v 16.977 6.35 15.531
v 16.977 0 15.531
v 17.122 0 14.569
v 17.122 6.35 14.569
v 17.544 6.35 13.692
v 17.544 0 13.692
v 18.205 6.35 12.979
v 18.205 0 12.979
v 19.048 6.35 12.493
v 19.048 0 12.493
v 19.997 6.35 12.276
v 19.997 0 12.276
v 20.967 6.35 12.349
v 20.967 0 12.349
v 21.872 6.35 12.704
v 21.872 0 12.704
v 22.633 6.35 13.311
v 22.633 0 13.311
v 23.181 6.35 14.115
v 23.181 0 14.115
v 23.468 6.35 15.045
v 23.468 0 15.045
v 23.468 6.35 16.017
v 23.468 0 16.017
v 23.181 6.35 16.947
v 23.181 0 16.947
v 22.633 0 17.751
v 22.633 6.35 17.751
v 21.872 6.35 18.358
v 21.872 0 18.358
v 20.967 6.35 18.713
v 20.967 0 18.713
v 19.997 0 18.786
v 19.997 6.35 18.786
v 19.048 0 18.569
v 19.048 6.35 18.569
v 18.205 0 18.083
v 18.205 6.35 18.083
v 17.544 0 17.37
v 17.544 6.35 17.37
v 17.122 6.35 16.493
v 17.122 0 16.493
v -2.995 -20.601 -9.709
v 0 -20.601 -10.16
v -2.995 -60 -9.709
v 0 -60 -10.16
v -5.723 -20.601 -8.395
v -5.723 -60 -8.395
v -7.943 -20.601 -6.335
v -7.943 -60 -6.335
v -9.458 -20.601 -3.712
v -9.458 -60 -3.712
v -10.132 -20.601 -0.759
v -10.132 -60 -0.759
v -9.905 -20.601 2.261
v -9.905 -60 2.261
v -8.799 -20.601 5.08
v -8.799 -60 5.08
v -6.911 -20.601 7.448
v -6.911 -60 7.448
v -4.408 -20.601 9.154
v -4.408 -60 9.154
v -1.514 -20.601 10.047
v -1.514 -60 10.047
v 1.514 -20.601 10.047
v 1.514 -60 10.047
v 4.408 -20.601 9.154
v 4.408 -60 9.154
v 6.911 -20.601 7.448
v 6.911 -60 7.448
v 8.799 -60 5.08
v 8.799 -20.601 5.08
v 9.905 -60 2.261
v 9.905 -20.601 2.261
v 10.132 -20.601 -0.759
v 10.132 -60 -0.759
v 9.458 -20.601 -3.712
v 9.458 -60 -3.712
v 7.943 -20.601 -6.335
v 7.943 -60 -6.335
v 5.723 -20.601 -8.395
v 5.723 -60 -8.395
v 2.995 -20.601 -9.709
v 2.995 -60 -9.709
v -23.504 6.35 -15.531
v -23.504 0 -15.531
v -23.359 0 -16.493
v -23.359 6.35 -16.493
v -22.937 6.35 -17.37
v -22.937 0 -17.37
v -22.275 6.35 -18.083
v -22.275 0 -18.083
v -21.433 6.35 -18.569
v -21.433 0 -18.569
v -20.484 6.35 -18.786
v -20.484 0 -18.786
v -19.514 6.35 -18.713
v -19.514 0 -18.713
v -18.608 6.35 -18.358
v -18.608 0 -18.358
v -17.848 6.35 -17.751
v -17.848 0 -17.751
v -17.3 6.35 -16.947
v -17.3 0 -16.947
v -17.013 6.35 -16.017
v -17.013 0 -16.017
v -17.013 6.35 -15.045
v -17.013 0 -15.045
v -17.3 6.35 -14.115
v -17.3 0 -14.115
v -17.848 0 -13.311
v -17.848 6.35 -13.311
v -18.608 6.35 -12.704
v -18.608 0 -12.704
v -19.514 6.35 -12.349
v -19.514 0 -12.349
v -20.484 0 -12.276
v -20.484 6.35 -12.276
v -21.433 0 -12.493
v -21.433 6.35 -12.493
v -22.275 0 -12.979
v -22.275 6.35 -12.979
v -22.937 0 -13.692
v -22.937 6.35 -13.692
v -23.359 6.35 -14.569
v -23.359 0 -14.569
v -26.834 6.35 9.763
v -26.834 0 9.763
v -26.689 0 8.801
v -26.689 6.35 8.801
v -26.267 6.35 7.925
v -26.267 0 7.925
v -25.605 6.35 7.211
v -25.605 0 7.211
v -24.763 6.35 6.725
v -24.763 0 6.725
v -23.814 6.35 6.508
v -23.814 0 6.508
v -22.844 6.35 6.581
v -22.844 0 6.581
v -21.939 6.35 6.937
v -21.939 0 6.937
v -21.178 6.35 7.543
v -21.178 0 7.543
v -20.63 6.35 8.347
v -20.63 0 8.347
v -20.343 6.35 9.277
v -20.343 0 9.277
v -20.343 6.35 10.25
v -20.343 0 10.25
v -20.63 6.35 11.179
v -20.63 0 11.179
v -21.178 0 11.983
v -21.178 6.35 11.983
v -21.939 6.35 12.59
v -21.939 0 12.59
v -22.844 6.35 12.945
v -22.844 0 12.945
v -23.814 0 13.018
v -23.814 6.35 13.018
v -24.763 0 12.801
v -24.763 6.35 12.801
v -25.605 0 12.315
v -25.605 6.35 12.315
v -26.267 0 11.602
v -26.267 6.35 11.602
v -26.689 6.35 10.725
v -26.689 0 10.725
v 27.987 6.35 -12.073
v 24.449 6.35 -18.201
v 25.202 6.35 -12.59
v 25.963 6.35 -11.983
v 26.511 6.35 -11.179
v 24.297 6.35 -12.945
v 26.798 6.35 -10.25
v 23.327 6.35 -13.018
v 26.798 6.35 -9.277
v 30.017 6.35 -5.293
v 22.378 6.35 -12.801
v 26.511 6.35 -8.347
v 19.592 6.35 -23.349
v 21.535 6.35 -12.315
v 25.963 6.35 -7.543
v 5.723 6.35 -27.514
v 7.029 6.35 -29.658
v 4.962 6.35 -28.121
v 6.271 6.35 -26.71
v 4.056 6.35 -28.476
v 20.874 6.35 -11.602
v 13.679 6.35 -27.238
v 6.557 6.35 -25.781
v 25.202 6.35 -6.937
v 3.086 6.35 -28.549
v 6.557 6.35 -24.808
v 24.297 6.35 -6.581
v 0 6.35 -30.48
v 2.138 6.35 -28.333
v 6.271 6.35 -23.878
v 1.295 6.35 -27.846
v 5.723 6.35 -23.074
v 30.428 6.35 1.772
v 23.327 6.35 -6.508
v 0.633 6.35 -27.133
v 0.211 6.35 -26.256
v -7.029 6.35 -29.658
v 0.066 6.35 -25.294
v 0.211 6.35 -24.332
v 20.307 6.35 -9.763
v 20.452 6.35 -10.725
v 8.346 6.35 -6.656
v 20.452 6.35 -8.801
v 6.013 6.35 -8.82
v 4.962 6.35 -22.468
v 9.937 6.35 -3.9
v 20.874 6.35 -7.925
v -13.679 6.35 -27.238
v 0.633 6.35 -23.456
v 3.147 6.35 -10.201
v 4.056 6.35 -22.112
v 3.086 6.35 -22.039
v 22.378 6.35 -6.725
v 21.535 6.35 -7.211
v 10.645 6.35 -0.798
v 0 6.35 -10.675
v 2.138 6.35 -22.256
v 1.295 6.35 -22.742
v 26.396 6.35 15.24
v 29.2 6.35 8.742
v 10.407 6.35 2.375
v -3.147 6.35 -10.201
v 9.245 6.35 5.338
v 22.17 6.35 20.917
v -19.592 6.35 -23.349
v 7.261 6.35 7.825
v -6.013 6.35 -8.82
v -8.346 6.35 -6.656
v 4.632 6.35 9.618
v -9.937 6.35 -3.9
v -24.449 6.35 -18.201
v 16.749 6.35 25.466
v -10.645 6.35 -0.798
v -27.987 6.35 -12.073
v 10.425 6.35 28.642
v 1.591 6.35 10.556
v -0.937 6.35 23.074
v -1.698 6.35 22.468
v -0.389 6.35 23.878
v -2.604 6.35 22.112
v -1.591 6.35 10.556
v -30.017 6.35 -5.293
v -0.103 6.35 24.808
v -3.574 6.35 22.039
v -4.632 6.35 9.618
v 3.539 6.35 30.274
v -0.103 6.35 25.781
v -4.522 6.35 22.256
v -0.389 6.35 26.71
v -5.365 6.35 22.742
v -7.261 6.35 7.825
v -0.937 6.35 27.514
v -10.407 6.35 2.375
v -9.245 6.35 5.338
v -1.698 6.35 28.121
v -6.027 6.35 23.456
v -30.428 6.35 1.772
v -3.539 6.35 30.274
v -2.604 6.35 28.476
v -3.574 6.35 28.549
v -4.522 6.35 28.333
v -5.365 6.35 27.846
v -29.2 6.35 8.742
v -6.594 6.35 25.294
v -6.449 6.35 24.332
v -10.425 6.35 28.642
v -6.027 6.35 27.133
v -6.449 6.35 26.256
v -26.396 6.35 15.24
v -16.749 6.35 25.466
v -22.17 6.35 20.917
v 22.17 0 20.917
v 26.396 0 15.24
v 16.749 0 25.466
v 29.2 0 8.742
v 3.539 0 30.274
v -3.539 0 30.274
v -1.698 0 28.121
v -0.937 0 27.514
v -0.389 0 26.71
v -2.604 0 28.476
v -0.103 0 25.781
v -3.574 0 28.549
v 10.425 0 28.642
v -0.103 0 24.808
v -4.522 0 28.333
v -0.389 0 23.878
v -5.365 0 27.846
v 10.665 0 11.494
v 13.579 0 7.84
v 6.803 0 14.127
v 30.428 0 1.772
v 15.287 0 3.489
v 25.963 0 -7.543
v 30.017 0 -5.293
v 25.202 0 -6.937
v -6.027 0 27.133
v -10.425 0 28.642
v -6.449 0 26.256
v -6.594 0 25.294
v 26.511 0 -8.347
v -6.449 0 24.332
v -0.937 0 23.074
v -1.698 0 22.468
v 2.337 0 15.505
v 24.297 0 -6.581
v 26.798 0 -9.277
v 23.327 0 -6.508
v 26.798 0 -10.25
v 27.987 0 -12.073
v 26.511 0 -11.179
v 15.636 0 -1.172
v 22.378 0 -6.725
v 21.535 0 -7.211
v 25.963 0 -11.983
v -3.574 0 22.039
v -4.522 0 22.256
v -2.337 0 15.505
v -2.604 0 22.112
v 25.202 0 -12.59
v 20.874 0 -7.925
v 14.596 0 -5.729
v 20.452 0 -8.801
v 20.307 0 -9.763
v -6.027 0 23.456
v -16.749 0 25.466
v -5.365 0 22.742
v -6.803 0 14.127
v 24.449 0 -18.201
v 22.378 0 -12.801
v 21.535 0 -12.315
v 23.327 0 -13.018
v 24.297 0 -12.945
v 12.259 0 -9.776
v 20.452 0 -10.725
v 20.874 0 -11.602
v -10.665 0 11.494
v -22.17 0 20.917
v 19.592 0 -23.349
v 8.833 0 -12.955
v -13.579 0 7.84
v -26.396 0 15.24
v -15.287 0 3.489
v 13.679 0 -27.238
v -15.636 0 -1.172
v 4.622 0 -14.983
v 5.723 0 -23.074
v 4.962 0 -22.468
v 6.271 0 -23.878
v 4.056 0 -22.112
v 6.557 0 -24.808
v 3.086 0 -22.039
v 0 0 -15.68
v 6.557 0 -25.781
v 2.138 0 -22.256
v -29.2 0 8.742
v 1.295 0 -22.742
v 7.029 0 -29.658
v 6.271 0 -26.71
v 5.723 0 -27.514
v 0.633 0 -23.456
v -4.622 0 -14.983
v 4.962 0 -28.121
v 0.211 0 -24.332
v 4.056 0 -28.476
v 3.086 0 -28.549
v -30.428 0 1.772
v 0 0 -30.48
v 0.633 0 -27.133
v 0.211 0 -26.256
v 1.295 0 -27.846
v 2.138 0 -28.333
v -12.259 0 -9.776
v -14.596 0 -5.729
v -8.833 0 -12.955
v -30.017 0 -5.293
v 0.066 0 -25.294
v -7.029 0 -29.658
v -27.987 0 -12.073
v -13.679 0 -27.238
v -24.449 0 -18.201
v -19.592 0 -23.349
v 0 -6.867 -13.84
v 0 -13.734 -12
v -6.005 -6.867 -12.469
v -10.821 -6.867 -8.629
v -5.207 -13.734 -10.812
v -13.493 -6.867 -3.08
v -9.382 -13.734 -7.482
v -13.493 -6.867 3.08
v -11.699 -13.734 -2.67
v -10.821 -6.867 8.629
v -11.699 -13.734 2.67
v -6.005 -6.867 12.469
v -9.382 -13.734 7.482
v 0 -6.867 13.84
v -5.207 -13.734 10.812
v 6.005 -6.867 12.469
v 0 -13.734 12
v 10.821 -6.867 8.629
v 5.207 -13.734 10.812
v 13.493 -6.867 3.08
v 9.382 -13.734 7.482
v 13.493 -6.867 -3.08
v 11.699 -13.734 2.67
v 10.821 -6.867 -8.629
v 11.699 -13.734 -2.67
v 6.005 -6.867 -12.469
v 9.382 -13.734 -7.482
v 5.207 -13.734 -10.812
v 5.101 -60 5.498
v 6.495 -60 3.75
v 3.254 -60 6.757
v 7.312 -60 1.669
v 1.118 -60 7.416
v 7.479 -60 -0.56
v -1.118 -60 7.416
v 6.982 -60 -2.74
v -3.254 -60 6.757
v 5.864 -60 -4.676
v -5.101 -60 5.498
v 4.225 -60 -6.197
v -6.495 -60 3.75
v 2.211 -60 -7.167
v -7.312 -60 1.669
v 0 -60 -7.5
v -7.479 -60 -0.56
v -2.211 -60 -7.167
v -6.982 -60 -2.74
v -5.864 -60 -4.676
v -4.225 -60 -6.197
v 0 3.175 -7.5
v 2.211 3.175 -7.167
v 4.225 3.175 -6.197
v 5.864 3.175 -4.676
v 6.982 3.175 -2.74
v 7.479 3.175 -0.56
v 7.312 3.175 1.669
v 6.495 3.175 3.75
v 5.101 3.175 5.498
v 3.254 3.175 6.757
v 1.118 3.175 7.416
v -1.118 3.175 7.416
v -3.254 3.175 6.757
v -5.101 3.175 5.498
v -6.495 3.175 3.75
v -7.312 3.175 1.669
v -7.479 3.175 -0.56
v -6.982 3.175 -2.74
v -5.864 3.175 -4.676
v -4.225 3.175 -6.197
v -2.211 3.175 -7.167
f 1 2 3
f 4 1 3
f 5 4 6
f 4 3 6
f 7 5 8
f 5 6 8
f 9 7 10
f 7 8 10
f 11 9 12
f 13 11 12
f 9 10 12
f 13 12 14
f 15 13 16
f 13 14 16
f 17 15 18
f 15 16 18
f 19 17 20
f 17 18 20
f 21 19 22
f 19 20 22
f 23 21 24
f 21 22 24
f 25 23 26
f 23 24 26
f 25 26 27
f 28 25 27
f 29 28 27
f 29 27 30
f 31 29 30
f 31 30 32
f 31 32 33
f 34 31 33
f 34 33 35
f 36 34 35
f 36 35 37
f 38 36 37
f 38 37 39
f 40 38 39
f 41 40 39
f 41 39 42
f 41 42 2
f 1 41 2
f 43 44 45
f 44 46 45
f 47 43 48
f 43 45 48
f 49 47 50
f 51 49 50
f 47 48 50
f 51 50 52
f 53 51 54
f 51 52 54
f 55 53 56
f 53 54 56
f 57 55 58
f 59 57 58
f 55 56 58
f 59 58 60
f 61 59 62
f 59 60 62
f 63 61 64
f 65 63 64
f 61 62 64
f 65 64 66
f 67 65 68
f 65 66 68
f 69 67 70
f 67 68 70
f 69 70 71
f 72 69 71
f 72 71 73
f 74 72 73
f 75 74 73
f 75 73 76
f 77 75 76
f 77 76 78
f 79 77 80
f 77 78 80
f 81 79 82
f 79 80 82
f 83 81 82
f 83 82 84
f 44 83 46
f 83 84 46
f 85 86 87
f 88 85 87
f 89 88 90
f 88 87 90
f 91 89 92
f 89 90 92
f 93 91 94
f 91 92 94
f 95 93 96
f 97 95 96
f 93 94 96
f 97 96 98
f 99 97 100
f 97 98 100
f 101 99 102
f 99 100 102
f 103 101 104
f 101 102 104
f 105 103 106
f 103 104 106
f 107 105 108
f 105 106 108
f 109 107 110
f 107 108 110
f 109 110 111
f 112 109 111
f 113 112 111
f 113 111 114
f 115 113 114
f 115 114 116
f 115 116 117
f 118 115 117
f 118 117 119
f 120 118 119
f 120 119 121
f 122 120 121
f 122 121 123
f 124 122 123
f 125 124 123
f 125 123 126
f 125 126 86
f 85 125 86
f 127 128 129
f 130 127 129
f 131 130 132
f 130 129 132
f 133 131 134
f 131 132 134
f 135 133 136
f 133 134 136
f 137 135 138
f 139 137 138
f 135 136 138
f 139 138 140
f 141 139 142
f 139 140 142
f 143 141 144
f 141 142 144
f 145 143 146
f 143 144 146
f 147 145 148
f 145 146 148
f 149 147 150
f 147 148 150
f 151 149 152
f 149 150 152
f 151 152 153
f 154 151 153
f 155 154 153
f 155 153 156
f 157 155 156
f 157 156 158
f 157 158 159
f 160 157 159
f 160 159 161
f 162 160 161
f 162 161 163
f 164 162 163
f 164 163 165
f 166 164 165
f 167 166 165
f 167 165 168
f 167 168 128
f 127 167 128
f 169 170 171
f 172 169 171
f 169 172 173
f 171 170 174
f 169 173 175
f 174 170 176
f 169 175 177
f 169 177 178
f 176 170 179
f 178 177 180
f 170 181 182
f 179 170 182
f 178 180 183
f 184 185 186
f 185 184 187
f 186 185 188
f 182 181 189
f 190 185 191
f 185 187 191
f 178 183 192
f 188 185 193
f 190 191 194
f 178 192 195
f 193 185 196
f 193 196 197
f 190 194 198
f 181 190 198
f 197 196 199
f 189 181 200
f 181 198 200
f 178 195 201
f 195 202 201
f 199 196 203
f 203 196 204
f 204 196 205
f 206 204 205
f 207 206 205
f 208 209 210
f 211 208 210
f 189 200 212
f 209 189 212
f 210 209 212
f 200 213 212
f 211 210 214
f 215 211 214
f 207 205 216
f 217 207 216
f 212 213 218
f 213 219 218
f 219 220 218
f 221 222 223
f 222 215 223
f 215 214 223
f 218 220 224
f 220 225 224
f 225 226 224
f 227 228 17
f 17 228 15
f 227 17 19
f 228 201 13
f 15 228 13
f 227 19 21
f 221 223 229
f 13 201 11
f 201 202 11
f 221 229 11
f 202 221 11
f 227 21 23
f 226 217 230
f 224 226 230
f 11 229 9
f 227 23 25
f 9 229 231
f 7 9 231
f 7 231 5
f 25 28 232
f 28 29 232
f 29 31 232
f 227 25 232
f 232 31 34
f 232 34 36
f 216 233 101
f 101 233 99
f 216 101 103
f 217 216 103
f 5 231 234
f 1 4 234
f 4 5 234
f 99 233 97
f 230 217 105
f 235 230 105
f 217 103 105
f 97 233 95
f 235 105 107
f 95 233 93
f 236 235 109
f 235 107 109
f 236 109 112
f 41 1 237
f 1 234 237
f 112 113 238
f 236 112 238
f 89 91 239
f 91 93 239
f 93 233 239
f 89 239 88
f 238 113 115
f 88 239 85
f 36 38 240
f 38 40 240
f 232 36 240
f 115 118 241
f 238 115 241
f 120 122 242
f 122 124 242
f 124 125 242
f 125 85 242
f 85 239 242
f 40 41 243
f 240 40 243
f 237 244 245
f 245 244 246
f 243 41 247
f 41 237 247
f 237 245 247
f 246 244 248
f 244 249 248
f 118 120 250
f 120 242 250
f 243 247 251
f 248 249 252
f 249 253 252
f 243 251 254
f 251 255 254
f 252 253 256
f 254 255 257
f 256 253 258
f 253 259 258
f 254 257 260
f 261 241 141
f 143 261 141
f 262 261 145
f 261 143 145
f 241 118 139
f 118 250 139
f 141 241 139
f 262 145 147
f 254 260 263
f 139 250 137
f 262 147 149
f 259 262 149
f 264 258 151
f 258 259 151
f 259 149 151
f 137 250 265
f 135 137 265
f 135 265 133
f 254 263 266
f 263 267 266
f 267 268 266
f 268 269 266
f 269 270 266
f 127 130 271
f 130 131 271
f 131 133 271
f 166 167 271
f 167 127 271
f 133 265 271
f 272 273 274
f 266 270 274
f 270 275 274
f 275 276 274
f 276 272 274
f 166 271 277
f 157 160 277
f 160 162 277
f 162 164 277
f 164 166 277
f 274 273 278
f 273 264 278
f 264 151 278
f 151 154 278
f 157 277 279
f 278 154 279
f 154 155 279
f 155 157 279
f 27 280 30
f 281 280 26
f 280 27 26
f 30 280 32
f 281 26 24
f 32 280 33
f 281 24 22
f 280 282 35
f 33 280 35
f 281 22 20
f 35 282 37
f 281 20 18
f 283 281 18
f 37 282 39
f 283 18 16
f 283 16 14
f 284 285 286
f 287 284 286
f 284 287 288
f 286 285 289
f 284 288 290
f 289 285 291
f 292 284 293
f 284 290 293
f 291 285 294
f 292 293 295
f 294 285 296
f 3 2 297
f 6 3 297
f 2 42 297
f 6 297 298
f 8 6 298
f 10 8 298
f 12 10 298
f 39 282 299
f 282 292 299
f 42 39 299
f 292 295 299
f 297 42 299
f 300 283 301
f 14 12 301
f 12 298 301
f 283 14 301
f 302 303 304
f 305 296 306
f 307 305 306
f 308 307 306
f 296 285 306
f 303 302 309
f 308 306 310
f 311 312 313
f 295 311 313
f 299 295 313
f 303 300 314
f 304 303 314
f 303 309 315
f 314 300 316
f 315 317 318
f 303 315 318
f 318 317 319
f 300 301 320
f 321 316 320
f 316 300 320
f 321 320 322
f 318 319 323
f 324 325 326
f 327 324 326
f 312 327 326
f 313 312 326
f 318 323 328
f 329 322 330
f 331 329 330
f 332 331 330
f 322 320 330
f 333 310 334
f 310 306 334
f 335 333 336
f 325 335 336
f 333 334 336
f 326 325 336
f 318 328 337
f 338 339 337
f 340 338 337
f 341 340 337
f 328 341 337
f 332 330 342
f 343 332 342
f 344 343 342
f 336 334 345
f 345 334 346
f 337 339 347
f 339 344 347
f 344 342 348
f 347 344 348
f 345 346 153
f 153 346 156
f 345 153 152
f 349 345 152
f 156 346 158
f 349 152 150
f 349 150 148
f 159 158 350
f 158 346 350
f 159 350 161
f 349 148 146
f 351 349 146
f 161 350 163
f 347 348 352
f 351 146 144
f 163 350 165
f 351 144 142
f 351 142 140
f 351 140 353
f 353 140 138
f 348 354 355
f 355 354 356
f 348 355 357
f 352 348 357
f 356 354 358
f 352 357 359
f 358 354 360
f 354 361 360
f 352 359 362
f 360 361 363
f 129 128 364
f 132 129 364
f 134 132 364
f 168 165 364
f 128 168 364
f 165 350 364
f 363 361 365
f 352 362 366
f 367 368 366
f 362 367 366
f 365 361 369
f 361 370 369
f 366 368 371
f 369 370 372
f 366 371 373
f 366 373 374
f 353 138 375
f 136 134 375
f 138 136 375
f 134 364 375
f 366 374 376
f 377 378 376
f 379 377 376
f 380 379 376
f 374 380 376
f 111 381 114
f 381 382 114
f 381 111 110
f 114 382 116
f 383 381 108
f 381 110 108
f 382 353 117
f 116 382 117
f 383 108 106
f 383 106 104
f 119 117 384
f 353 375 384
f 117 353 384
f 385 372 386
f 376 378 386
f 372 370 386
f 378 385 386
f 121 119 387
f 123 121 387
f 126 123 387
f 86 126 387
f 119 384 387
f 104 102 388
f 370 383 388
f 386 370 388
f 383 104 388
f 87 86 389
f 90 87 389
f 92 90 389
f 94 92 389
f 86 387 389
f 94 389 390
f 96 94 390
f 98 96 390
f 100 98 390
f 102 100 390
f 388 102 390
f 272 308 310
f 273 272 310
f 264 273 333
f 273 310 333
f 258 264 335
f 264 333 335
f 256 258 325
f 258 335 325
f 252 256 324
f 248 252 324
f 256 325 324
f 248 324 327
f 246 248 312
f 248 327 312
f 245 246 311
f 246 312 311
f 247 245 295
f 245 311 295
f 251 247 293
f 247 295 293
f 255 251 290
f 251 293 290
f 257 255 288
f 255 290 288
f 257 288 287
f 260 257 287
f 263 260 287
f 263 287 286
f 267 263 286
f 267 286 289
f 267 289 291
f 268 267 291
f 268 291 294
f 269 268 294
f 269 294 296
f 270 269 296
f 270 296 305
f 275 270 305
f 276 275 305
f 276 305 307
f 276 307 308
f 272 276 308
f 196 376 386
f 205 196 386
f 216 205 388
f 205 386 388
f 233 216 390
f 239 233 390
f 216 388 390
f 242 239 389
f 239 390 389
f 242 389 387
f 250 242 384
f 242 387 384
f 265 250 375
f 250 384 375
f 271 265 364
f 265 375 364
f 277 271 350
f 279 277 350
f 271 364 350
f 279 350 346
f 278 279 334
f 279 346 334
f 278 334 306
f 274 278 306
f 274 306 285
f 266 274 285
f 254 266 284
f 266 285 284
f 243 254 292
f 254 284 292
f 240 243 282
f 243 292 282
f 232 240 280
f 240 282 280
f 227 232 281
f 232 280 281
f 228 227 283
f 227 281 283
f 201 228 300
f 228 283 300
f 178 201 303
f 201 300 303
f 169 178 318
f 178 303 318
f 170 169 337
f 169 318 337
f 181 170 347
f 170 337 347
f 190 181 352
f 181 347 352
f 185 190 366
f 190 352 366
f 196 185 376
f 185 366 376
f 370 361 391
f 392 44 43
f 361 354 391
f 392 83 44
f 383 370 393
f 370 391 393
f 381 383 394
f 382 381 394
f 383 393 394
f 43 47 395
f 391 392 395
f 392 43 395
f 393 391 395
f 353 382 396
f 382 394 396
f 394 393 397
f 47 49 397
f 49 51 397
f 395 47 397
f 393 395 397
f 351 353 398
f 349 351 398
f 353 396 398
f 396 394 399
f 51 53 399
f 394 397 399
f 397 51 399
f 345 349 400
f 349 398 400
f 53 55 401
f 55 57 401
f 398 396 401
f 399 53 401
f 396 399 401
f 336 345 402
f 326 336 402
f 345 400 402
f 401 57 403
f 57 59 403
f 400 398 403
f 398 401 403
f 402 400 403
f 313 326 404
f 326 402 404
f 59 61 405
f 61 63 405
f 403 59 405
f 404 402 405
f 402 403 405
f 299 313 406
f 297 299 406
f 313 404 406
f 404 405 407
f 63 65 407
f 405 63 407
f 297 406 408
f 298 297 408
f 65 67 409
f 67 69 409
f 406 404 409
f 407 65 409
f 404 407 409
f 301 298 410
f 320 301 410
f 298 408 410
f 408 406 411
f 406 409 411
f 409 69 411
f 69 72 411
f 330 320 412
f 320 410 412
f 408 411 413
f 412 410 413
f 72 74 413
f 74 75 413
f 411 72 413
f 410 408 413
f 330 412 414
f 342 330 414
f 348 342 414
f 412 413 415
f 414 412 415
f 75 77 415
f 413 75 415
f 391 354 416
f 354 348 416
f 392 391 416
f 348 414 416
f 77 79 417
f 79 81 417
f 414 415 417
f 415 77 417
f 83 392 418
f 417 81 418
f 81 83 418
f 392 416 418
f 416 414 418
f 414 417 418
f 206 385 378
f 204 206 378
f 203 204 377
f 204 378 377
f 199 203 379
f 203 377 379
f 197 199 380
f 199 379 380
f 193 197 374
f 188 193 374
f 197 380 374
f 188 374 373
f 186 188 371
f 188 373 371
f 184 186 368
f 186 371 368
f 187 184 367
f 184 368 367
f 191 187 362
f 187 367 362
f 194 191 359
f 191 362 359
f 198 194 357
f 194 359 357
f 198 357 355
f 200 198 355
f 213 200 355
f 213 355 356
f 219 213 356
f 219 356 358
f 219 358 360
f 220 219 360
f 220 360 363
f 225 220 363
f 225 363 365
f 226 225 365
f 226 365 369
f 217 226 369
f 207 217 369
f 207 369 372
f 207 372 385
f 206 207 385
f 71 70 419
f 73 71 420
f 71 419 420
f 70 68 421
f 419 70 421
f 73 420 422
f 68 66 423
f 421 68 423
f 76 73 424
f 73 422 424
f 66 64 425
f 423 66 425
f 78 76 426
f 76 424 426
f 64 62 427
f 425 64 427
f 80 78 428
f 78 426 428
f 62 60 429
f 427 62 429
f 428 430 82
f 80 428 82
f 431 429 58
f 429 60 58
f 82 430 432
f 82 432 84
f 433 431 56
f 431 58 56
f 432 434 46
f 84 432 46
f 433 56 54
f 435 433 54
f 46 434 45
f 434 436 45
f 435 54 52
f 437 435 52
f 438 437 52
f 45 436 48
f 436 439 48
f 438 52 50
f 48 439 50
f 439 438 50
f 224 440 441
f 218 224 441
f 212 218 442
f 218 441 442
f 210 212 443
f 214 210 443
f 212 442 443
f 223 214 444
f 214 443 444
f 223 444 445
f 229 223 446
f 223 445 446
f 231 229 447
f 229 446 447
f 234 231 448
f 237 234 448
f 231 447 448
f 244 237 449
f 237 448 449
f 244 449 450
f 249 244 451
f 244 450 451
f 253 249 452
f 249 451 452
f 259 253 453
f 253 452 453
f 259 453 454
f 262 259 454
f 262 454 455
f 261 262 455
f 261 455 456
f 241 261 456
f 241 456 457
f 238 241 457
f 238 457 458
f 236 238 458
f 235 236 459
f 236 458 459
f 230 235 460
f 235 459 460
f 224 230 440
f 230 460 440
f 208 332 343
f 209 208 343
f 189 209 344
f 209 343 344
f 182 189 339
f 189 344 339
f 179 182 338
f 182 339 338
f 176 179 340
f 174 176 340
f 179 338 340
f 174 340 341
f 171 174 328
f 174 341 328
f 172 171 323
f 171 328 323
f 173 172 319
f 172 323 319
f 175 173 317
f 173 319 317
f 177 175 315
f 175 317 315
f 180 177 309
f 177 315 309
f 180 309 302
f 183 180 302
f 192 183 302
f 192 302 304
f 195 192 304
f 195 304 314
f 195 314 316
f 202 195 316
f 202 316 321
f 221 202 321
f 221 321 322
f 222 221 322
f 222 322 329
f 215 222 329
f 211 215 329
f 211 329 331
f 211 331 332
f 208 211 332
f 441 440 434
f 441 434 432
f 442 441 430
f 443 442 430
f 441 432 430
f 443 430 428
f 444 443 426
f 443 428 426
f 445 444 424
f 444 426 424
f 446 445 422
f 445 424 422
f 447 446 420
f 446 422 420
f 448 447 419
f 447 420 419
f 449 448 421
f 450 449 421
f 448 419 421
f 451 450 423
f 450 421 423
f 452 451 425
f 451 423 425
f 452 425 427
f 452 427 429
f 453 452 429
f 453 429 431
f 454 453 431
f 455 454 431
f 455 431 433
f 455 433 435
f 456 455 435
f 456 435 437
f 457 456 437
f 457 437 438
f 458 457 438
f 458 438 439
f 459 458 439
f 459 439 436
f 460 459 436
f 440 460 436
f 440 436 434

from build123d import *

# Parameters (mm, degrees)
SKETCH5_R                   = 7.5
CUT_EXTRUDE1_DEPTH          = 90
SKETCH6_R                   = 3.5
CUT_EXTRUDE2_DEPTH          = 20
CIRPATTERN1_COUNT           = 6
SKETCH11_R                  = 3.18
CUT_EXTRUDE4_DEPTH          = 101.105860558
SKETCH23_R                  = 30.48
CUT_EXTRUDE6_DEPTH          = 80.122584091
F_1_4_CLEARANCE_HOLE1_D     = 6.5278
F_1_4_CLEARANCE_HOLE1_DEPTH = 15.4203
F_1_4_CLEARANCE_HOLE1_TIP   = 1.961148974
CHAMFER1_SIZE               = 3.175


with BuildPart() as part:
    # Sketch1 → Revolve1 (revolve)
    with BuildSketch(Plane(origin=(0, 0, 0), x_dir=(0, 0, -1), z_dir=(1, 0, 0))):
        Polygon((0, 30.35), (12.7, 30.35), (12.7, 6.35), (30.48, 6.35), (30.48, 0), (15.68, 0), (10.16, -20.600920458), (10.16, -60), (0, -60), align=None)
    revolve(axis=Axis((0, 0, 0), (0, 1, 0)))

    # Sketch5 → Cut-Extrude1 (cut)
    with BuildSketch(Plane.XZ.offset(60)):
        Circle(SKETCH5_R)
    extrude(amount=-CUT_EXTRUDE1_DEPTH, mode=Mode.SUBTRACT)

    # Sketch6 → Cut-Extrude2 (cut, symmetric)
    with BuildSketch(Plane.XY):
        with Locations((0, 16.659966967)):
            Circle(SKETCH6_R)
    cut_extrude2 = extrude(amount=CUT_EXTRUDE2_DEPTH, both=True, mode=Mode.SUBTRACT)

    # CirPattern1: Cut-Extrude2 ×6 about axis
    cirpattern1_axis = Axis((0, 30.35, 0), (0, -1, 0))
    for i in range(1, CIRPATTERN1_COUNT):
        add(cut_extrude2.rotate(cirpattern1_axis, i * 360 / CIRPATTERN1_COUNT), mode=Mode.SUBTRACT)

    # Sketch11 → Cut-Extrude4 (cut, through all)
    with BuildSketch(Plane(origin=(0, 30.35, 0), x_dir=(1, 0, 0), z_dir=(0, 1, 0))):
        Circle(SKETCH11_R)
    extrude(amount=-CUT_EXTRUDE4_DEPTH, mode=Mode.SUBTRACT)

    # Sketch23 → Cut-Extrude6 (cut, through all)
    with BuildSketch(Plane(origin=(0, 6.35, 0), x_dir=(1, 0, 0), z_dir=(0, 1, 0))):
        Circle(SKETCH23_R)
    extrude(amount=CUT_EXTRUDE6_DEPTH, mode=Mode.SUBTRACT)

    # 1/4 Clearance Hole1
    with Locations(Plane(origin=(0, 6.35, 0), x_dir=(1, 0, 0), z_dir=(0, 1, 0))):
        with Locations((3.330049479, 25.294237026), (-20.240427094, 15.531025958), (23.570476573, 9.763211068), (20.240427094, -15.531025958), (-3.330049479, -25.294237026), (-23.570476573, -9.763211068)):
            Hole(F_1_4_CLEARANCE_HOLE1_D / 2, depth=F_1_4_CLEARANCE_HOLE1_DEPTH)
            with Locations((0, 0, -(F_1_4_CLEARANCE_HOLE1_DEPTH + F_1_4_CLEARANCE_HOLE1_TIP / 2))):  # 118° drill point
                Cone(0, F_1_4_CLEARANCE_HOLE1_D / 2, F_1_4_CLEARANCE_HOLE1_TIP, mode=Mode.SUBTRACT)

    # Chamfer1
    chamfer1_edges = [part.edges().sort_by_distance(p)[0] for p in [
        (-7.5, 6.35, 0),
    ]]
    chamfer(chamfer1_edges, length=CHAMFER1_SIZE)


solid = part.part
